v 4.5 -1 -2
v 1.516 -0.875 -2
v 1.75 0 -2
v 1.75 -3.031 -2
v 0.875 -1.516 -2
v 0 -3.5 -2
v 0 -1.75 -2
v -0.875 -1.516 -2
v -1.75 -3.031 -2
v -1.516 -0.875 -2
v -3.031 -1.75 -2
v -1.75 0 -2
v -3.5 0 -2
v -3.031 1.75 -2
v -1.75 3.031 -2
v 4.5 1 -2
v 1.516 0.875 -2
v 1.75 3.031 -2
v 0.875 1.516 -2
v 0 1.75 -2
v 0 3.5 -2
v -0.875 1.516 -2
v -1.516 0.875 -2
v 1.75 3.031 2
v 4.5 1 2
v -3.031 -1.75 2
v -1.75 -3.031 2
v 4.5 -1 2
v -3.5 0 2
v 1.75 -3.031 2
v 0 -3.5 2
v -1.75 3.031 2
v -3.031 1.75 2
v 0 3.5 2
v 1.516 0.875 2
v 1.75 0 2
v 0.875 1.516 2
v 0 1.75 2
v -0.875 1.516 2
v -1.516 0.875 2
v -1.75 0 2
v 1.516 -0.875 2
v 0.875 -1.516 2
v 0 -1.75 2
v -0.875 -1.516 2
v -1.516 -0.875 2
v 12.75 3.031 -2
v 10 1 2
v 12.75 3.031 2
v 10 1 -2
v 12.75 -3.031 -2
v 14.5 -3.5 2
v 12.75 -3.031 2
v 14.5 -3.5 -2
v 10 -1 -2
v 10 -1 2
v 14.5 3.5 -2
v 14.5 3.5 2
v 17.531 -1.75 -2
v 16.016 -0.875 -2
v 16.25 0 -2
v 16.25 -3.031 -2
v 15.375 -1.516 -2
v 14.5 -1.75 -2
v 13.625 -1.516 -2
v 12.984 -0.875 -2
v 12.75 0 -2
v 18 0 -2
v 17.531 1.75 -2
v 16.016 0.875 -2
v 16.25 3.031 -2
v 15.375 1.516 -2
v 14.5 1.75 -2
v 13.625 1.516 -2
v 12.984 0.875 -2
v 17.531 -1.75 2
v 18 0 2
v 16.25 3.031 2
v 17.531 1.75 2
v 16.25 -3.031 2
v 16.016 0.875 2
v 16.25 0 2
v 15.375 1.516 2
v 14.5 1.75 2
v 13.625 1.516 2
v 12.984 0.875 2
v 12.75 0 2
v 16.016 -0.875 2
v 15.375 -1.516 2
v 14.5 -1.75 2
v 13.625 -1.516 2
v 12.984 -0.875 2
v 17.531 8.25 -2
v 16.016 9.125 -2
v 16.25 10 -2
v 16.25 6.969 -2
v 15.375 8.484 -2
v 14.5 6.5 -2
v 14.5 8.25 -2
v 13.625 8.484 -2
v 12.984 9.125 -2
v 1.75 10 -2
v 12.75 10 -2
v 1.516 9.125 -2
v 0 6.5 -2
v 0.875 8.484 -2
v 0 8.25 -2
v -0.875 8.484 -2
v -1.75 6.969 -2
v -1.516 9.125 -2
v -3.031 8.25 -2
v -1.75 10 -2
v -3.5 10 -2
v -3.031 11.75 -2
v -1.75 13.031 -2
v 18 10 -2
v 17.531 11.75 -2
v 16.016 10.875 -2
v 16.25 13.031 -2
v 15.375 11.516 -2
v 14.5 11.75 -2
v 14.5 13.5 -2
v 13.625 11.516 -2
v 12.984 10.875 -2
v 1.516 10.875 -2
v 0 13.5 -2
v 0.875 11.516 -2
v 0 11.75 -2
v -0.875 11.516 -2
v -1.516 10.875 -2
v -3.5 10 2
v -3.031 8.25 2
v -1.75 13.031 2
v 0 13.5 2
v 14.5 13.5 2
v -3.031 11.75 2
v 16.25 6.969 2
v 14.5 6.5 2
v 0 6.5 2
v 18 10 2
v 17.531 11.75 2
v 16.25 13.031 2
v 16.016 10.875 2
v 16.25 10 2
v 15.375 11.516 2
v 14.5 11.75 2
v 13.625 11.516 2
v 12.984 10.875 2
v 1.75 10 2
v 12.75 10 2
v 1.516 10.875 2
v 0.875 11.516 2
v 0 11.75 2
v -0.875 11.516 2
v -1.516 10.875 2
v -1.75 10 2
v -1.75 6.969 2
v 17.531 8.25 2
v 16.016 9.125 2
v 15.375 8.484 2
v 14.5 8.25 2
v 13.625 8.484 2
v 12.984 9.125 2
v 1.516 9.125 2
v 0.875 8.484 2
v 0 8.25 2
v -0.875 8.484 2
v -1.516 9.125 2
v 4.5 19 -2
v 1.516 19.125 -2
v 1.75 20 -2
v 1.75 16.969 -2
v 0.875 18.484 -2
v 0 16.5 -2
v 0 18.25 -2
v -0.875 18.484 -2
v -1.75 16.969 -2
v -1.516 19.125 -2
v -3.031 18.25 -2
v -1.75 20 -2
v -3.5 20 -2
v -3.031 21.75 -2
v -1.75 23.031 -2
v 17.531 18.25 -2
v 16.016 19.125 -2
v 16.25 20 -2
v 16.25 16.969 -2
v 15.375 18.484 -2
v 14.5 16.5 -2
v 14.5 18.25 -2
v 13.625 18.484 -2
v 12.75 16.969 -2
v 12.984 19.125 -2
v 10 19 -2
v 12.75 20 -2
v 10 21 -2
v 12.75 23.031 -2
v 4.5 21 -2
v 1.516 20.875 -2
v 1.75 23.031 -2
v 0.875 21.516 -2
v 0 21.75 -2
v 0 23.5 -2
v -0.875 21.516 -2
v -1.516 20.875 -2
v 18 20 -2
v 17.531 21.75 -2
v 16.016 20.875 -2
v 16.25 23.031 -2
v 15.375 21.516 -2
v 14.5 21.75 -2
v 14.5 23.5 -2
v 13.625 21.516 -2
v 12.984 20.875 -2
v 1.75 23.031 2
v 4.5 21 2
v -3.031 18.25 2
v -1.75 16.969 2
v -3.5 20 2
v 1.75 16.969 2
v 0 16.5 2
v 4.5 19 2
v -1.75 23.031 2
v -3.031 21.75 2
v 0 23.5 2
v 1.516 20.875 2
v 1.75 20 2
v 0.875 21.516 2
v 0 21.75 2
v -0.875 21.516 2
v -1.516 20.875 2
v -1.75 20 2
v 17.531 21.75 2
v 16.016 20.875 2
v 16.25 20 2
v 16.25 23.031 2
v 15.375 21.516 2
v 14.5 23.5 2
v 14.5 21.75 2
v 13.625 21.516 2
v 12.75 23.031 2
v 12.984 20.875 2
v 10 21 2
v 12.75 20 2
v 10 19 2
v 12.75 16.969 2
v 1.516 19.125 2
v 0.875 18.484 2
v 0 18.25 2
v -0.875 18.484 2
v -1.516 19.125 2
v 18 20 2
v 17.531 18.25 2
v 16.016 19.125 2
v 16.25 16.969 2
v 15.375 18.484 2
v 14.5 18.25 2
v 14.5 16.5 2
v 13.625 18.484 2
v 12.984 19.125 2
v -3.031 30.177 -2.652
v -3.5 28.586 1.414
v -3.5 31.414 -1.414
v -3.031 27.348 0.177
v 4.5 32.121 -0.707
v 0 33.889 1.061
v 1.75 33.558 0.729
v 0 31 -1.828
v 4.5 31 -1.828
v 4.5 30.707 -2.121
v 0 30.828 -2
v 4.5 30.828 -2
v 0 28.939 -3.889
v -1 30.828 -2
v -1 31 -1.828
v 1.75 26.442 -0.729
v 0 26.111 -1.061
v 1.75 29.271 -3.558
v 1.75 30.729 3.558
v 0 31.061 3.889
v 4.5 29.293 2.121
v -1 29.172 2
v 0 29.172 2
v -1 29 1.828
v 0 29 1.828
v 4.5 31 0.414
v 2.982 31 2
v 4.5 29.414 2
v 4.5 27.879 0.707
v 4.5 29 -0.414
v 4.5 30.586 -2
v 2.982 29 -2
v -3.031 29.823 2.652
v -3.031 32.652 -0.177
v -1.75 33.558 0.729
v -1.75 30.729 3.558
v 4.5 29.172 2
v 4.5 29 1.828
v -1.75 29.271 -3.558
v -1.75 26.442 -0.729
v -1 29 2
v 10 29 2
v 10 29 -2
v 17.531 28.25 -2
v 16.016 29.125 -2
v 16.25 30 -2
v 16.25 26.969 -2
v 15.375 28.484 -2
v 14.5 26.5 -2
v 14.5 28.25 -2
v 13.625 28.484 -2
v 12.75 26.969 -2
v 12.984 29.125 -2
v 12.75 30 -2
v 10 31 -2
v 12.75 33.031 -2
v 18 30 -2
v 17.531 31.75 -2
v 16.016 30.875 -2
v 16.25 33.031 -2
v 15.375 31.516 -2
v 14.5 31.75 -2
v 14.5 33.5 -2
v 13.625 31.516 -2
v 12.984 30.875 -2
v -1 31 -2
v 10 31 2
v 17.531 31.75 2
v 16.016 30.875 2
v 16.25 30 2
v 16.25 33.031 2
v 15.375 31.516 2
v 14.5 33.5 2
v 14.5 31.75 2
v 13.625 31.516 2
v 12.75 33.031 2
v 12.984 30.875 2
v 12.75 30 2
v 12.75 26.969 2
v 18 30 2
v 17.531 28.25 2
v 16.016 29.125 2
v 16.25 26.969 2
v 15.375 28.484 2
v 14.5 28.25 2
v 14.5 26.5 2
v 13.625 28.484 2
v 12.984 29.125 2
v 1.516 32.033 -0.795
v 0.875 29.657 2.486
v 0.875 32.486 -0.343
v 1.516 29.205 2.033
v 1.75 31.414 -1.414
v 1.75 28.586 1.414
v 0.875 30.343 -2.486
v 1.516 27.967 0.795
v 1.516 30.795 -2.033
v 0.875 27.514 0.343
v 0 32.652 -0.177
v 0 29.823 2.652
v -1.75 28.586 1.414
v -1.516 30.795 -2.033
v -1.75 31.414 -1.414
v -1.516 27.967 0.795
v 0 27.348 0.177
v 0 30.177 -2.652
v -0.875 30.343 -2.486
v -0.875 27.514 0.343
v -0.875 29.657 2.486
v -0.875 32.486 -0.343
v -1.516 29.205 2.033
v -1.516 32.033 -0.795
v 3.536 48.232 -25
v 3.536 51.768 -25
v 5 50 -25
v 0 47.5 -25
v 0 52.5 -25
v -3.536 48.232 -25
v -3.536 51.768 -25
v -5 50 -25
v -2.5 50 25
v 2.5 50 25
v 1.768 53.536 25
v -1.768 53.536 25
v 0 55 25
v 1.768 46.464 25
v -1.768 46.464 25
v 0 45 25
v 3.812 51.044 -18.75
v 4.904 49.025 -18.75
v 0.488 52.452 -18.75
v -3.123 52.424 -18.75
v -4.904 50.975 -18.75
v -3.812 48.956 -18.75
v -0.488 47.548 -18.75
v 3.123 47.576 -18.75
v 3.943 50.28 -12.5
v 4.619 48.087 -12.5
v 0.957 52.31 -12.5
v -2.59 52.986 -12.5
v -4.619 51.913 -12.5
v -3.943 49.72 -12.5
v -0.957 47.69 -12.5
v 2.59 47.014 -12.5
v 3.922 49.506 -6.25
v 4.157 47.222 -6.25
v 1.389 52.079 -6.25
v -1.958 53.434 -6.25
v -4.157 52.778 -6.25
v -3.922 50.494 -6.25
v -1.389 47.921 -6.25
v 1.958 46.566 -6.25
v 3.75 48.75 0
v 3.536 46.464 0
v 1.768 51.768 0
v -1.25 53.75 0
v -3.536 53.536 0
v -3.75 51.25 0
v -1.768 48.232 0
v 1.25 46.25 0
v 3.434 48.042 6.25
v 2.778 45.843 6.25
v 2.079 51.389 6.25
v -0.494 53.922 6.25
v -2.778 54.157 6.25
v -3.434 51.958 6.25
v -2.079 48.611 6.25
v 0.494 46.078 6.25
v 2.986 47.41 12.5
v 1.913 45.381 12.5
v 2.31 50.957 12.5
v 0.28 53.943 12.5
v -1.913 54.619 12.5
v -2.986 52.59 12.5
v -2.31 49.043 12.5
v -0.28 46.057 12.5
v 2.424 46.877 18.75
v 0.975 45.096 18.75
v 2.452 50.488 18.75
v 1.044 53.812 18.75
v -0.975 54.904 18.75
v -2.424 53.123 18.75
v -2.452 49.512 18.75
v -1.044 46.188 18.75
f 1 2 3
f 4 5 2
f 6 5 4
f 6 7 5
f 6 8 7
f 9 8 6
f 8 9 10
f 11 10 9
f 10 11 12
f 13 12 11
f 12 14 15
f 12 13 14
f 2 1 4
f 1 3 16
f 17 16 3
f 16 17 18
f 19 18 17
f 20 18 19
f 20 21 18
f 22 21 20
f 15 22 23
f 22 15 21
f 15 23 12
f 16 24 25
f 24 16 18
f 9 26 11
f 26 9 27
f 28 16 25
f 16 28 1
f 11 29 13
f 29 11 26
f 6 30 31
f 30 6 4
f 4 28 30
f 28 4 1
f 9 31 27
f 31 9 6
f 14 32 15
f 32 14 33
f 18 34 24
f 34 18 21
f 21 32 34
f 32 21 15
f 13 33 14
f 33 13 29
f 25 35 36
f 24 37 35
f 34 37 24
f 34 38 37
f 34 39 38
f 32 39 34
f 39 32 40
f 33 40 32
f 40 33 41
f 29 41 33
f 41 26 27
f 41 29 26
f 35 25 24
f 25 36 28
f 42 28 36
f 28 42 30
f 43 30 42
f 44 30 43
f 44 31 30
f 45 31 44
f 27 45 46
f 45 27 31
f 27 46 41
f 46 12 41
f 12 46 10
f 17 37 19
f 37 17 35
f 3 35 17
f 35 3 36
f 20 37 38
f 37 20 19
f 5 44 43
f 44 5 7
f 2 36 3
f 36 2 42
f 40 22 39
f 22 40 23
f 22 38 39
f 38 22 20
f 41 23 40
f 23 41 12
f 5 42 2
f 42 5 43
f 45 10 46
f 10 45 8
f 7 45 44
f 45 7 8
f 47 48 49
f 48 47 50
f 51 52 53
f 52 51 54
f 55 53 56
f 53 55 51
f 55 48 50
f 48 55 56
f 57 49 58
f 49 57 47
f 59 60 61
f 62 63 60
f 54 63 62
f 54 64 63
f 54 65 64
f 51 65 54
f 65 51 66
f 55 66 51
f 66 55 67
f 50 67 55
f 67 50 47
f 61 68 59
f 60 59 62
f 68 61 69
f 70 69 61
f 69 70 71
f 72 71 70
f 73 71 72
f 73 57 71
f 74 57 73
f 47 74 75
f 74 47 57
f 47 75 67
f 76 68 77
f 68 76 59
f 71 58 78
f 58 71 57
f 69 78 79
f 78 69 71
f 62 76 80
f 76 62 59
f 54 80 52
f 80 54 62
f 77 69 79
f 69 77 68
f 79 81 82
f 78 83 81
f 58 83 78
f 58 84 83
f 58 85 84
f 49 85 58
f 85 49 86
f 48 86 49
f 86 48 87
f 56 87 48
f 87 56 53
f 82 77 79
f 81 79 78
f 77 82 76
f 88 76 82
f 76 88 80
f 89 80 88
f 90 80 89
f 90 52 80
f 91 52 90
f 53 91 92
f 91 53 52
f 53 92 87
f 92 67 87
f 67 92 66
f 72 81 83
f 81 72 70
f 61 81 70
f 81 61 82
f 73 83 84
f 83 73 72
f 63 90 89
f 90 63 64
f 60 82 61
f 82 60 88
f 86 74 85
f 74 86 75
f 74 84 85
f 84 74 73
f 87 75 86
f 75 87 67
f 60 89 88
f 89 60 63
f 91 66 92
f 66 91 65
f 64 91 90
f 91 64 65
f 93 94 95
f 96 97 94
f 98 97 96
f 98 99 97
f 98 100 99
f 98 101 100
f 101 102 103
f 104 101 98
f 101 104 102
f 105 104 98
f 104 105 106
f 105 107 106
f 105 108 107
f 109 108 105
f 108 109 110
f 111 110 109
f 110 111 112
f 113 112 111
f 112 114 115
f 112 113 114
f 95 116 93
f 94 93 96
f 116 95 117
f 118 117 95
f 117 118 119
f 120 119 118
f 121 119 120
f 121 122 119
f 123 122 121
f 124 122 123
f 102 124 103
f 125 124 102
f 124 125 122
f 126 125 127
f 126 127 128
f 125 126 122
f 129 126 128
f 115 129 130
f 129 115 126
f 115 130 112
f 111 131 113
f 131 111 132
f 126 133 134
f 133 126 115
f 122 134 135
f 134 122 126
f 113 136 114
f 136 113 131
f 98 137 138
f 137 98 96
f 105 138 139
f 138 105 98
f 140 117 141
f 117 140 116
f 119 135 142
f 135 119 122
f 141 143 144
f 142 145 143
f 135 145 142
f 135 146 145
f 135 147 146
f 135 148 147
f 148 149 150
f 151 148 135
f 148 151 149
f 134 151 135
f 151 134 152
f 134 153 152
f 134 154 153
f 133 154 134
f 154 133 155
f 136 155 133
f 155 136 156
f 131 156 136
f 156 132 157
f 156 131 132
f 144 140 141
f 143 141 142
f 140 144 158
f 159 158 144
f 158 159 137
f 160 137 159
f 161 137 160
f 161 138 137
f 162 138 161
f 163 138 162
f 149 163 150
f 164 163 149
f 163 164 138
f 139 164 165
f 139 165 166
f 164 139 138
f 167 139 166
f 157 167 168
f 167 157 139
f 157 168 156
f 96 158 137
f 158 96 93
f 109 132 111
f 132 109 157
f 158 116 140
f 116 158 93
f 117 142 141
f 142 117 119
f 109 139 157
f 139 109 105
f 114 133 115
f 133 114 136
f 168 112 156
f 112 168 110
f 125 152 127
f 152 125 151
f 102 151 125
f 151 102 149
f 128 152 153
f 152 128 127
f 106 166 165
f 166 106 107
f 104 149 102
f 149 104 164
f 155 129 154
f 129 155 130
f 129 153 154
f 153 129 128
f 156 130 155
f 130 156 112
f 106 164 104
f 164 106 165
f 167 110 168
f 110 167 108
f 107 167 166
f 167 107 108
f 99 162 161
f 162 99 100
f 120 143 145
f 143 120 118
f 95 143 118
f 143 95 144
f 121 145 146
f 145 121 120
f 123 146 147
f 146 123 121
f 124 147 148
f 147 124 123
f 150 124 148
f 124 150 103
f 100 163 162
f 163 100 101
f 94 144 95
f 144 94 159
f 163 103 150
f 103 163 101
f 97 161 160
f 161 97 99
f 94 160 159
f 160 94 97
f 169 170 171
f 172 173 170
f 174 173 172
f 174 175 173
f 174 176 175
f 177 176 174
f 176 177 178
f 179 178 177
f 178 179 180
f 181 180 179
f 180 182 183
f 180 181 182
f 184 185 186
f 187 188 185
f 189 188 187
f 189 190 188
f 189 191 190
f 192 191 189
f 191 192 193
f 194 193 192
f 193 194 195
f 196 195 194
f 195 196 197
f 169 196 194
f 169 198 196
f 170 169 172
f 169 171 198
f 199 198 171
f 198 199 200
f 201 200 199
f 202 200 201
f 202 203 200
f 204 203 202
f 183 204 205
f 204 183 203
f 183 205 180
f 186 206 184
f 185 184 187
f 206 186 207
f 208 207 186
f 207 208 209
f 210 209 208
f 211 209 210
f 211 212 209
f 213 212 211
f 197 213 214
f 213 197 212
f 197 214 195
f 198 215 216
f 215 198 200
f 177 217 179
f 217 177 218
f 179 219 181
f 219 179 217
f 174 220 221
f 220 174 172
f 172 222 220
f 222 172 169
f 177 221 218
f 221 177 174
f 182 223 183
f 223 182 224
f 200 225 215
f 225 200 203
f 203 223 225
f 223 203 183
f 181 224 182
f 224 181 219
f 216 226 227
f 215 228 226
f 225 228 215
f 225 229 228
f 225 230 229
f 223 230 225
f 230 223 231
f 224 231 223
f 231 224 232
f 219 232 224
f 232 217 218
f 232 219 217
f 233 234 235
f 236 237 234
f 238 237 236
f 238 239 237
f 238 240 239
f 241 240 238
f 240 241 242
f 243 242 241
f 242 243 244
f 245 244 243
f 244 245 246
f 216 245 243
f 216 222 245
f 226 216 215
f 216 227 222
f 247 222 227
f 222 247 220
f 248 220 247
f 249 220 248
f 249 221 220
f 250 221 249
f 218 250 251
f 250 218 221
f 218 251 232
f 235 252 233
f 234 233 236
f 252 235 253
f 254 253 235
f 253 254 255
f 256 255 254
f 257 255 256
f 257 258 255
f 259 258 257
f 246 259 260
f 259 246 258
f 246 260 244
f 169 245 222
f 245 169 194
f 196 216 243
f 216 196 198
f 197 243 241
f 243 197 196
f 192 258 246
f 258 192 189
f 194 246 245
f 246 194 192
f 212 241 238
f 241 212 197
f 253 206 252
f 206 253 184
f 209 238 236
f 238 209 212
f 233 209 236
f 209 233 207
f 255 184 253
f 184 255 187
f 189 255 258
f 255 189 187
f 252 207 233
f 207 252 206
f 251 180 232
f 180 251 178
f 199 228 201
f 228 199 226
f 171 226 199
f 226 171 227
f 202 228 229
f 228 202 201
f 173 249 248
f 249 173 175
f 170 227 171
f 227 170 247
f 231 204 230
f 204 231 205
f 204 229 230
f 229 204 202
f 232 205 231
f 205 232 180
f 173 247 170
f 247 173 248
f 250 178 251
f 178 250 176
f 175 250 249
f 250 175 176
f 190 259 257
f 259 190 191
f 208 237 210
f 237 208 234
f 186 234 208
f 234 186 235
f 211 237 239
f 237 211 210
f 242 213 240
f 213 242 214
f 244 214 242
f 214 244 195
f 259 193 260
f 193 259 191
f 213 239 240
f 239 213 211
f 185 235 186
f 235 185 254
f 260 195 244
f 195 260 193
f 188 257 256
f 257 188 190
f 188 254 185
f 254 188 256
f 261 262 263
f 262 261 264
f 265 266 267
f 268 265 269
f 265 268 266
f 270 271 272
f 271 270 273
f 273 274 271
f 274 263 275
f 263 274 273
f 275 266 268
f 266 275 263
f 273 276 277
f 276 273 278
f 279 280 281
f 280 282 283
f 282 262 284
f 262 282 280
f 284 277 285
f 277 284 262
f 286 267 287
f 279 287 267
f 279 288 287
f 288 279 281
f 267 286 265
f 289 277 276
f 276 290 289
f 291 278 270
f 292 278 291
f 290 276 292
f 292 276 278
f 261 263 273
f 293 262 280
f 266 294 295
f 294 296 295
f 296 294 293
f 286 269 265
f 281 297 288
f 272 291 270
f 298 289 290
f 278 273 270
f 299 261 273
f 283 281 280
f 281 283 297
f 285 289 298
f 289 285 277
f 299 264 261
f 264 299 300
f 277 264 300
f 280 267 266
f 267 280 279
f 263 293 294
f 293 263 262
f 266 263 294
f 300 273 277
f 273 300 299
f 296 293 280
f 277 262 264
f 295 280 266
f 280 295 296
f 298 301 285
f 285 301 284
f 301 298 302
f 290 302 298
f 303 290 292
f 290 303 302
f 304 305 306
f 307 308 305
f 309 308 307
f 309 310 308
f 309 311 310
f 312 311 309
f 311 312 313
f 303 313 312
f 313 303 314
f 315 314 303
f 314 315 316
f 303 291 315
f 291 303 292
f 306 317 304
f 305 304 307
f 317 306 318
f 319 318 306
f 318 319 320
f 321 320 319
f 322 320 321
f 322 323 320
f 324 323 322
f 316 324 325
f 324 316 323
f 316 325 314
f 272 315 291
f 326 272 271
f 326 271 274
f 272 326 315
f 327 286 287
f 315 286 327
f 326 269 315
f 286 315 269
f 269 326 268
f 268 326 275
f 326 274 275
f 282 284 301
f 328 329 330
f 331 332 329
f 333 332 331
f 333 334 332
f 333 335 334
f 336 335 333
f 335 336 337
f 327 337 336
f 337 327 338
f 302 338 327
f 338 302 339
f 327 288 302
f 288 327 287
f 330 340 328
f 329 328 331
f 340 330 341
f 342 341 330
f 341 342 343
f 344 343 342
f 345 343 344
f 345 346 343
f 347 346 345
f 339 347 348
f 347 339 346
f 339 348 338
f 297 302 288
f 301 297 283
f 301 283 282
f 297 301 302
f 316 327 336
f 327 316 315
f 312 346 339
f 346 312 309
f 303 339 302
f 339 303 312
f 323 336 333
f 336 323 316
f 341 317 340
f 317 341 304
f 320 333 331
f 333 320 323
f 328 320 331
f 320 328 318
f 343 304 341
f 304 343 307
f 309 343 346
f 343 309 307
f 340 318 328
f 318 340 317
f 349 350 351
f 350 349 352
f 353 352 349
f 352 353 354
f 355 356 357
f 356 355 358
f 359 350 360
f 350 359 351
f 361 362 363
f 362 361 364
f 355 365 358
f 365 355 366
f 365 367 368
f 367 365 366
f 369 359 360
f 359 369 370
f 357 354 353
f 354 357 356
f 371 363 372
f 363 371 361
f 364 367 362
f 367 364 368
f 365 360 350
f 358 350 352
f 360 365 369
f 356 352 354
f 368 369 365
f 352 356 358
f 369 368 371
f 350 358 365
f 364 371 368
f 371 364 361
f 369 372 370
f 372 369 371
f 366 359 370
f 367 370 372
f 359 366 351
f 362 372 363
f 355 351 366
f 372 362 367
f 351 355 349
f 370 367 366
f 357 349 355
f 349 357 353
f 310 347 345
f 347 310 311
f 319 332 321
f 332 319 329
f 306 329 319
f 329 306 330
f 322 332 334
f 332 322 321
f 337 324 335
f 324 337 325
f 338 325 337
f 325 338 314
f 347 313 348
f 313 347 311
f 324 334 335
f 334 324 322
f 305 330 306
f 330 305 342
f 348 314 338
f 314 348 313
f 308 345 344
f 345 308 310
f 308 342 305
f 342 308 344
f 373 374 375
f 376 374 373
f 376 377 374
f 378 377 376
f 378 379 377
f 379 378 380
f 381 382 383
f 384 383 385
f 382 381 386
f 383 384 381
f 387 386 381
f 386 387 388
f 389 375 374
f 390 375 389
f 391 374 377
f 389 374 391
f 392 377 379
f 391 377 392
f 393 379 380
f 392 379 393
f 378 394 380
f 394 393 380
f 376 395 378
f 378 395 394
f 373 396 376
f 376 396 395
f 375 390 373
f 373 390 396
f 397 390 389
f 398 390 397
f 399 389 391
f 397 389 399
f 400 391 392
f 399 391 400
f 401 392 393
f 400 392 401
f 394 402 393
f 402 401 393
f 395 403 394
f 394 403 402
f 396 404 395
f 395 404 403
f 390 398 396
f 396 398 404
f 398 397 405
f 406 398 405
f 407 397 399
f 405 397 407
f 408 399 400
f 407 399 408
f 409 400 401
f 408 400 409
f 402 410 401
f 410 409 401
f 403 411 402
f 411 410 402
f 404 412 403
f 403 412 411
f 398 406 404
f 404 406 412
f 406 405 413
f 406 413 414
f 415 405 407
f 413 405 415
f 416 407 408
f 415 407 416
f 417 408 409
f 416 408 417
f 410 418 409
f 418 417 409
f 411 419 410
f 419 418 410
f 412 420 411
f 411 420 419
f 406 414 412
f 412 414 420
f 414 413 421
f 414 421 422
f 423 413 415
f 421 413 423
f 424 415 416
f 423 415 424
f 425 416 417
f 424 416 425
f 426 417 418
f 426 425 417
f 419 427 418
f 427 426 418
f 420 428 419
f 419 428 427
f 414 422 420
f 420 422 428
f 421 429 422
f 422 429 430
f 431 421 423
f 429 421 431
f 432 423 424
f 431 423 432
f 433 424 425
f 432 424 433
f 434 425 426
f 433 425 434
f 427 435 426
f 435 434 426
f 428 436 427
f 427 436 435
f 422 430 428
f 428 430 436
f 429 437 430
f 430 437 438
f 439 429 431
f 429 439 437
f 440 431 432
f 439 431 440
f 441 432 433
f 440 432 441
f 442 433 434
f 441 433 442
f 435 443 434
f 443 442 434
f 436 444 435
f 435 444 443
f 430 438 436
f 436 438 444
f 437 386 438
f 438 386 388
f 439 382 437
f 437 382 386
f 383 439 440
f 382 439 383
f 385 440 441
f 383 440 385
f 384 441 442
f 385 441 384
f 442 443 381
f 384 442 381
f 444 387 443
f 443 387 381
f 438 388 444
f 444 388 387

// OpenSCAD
 poly_n = 12;
 diametro = 7;
 radio= diametro/2;
 altura =4;
 
 
 //color("#aa0000")cylinder(h = altura, d=diametro, center = true, $fn=poly_n);
 // translate([0, 10, 0.0])
  
  
difference(){
hull(){
  cylinder(h = altura, d=diametro, center = true, $fn=poly_n); 
  translate([radio, 0, 0.0])
  cube([2,2,altura],center = true);
 }
    cylinder(h = altura, d=diametro*.5, center = true, $fn=poly_n);
}

translate([10+radio+1, 0, 0.0]){
 difference(){
hull(){
   cylinder(h = altura, d=diametro, center = true, $fn=poly_n);
  translate([-radio, 0, 0.0])
  cube([2,2,altura],center = true);
 }
   cylinder(h = altura, d=diametro*.5, center = true, $fn=poly_n);
}}


//------------------------

translate([ 0, 10.0]){
difference(){
hull(){
  cylinder(h = altura, d=diametro, center = true, $fn=poly_n); 
  translate([radio, 0, 0.0])
  cube([2,2,altura],center = true);
  translate([10+radio+1, 0, 0.0]){
  cylinder(h = altura, d=diametro, center = true, $fn=poly_n);
  translate([-radio, 0, 0.0])
  cube([2,2,altura],center = true);
   }
}
  cylinder(h = altura, d=diametro*.5, center = true, $fn=poly_n);
  translate([10+radio+1, 0, 0.0]){
  cylinder(h = altura, d=diametro*.5, center = true, $fn=poly_n);
}}}


//------------------------

translate([ 0, 20.0]){
difference(){
union(){
hull(){
  cylinder(h = altura, d=diametro, center = true, $fn=poly_n); 
  translate([radio, 0, 0.0])
  cube([2,2,altura],center = true);
 }
 hull(){
   cube([2,2,altura],center = true);
   translate([10+radio+1, 0, 0.0])

translate([-radio, 0, 0.0])
  cube([2,2,altura],center = true);
  }
 
 translate([10+radio+1, 0, 0.0]){
  hull(){
  cylinder(h = altura, d=diametro, center = true, $fn=poly_n);
  translate([-radio, 0, 0.0])
  cube([2,2,altura],center = true);
   }
  }
 }
  cylinder(h = altura, d=diametro*.5, center = true, $fn=poly_n);
  translate([10+radio+1, 0, 0.0]){
  cylinder(h = altura, d=diametro*.5, center = true, $fn=poly_n);
}}}

//---------- tema acple hirts y mejor degradado entre partes!!!!

rotarJunta= 45;
translate([ 0, 30.0]){
difference(){
union(){
hull(){
 rotate([rotarJunta,0,0]){
  cylinder(h = altura, d=diametro, center = true, $fn=poly_n); 
  translate([radio, 0, 0.0])
  cube([2,2,altura],center = true);
 }}
 hull(){
   cube([2,2,altura],center = true);
   translate([10+radio+1, 0, 0.0])

translate([-radio, 0, 0.0])
  cube([2,2,altura],center = true);
  }
 
 translate([10+radio+1, 0, 0.0]){
  hull(){
  cylinder(h = altura, d=diametro, center = true, $fn=poly_n);
  translate([-radio, 0, 0.0])
  cube([2,2,altura],center = true);
   }
  }
 } 
   rotate([rotarJunta,0,0]){
    cylinder(h = altura, d=diametro*.5, center = true, $fn=poly_n);
   }
  translate([10+radio+1, 0, 0.0]){
  cylinder(h = altura, d=diametro*.5, center = true, $fn=poly_n);
}}}

translate([ 0, 50.0]){

linear_extrude(height=50,center=true,twist=90)
    scale([2,1,1])
    circle(d=5);
}
//
//minkowski(){
// 
//   translate([0, 0,-altura/2.0])
//
//  cube([2,2,altura]);
//  translate([10, 0, 0.0])
//
// cylinder(h = altura, d=diametro, center = true, $fn=poly_n);
//
// }
